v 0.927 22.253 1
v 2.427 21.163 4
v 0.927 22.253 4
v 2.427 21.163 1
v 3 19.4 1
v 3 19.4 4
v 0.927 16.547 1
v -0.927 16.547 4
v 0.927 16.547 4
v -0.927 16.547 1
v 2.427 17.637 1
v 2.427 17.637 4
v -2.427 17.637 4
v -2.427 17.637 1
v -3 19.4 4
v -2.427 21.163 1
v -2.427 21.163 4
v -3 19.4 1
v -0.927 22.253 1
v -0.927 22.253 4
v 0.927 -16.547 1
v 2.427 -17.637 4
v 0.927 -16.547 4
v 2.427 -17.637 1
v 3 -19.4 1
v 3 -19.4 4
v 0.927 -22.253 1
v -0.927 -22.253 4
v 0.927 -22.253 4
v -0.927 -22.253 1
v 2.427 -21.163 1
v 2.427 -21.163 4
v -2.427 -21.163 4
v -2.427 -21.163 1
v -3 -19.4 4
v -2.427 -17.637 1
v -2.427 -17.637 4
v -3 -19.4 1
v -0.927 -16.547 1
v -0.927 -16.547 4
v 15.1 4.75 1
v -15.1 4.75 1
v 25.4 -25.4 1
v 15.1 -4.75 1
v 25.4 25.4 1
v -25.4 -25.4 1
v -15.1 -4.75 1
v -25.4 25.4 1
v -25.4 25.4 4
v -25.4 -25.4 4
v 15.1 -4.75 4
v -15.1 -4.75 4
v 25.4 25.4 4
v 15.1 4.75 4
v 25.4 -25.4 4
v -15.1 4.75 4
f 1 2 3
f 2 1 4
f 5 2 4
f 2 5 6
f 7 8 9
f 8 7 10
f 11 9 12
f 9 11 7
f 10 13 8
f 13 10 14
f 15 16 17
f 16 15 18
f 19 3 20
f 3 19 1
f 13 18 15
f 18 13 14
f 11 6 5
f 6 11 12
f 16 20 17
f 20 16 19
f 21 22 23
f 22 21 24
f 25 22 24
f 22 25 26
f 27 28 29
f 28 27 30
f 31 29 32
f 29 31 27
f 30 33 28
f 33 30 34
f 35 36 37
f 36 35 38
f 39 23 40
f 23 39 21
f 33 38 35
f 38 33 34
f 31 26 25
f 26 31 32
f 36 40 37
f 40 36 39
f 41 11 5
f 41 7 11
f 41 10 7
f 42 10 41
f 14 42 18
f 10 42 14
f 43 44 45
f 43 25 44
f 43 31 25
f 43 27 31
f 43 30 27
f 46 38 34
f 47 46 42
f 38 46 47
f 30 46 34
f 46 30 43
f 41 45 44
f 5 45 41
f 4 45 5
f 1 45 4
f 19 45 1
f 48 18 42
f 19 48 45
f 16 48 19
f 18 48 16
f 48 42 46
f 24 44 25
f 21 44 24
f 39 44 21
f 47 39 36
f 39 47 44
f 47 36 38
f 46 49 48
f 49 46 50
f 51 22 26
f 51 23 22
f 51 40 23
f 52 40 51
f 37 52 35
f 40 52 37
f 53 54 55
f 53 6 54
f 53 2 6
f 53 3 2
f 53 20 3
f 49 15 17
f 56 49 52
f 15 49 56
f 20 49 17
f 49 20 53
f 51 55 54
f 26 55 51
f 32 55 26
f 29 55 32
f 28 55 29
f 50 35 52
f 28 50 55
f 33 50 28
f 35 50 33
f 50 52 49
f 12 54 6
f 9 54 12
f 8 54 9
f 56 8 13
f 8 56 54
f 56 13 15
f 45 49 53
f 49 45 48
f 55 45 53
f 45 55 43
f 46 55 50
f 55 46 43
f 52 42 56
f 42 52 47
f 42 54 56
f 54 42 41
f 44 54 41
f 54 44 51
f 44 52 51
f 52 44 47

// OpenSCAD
//https://scandigital.com/pages/film-formats#:~:text=35mm%20Slides%20are%20individual%2035mm,wide)%20depending%20on%20the%20manufacturer.
//35 - 36 x 24 mm
//H – 30.2 × 16.7 mm
//C – 25.1 × 16.7 mm
//P – 30.2 × 9.5 mm
baseX = 50.8;
baseY = 50.8;
windowX = 30.2;
windowY = 9.5;
baseThickness = 3;
magnetRadius = 3;
//ToDo: groove for film
filmX = 10;
filmY = 10;
filmThickness = 1.4;
filmOffset = 2;
difference(){
    translate([0, 0, 1])
        linear_extrude(baseThickness)
            square([baseX, baseY], true);
    linear_extrude(baseThickness + 2)
        square([windowX, windowY], true);
    union(){
        translate([0, baseY / 2 - magnetRadius * 2, 0])
            linear_extrude(baseThickness + 2)
                circle(magnetRadius);
        translate([0, - baseY / 2 + magnetRadius * 2, 0])
            linear_extrude(baseThickness + 2)
                circle(magnetRadius);
    }
}
